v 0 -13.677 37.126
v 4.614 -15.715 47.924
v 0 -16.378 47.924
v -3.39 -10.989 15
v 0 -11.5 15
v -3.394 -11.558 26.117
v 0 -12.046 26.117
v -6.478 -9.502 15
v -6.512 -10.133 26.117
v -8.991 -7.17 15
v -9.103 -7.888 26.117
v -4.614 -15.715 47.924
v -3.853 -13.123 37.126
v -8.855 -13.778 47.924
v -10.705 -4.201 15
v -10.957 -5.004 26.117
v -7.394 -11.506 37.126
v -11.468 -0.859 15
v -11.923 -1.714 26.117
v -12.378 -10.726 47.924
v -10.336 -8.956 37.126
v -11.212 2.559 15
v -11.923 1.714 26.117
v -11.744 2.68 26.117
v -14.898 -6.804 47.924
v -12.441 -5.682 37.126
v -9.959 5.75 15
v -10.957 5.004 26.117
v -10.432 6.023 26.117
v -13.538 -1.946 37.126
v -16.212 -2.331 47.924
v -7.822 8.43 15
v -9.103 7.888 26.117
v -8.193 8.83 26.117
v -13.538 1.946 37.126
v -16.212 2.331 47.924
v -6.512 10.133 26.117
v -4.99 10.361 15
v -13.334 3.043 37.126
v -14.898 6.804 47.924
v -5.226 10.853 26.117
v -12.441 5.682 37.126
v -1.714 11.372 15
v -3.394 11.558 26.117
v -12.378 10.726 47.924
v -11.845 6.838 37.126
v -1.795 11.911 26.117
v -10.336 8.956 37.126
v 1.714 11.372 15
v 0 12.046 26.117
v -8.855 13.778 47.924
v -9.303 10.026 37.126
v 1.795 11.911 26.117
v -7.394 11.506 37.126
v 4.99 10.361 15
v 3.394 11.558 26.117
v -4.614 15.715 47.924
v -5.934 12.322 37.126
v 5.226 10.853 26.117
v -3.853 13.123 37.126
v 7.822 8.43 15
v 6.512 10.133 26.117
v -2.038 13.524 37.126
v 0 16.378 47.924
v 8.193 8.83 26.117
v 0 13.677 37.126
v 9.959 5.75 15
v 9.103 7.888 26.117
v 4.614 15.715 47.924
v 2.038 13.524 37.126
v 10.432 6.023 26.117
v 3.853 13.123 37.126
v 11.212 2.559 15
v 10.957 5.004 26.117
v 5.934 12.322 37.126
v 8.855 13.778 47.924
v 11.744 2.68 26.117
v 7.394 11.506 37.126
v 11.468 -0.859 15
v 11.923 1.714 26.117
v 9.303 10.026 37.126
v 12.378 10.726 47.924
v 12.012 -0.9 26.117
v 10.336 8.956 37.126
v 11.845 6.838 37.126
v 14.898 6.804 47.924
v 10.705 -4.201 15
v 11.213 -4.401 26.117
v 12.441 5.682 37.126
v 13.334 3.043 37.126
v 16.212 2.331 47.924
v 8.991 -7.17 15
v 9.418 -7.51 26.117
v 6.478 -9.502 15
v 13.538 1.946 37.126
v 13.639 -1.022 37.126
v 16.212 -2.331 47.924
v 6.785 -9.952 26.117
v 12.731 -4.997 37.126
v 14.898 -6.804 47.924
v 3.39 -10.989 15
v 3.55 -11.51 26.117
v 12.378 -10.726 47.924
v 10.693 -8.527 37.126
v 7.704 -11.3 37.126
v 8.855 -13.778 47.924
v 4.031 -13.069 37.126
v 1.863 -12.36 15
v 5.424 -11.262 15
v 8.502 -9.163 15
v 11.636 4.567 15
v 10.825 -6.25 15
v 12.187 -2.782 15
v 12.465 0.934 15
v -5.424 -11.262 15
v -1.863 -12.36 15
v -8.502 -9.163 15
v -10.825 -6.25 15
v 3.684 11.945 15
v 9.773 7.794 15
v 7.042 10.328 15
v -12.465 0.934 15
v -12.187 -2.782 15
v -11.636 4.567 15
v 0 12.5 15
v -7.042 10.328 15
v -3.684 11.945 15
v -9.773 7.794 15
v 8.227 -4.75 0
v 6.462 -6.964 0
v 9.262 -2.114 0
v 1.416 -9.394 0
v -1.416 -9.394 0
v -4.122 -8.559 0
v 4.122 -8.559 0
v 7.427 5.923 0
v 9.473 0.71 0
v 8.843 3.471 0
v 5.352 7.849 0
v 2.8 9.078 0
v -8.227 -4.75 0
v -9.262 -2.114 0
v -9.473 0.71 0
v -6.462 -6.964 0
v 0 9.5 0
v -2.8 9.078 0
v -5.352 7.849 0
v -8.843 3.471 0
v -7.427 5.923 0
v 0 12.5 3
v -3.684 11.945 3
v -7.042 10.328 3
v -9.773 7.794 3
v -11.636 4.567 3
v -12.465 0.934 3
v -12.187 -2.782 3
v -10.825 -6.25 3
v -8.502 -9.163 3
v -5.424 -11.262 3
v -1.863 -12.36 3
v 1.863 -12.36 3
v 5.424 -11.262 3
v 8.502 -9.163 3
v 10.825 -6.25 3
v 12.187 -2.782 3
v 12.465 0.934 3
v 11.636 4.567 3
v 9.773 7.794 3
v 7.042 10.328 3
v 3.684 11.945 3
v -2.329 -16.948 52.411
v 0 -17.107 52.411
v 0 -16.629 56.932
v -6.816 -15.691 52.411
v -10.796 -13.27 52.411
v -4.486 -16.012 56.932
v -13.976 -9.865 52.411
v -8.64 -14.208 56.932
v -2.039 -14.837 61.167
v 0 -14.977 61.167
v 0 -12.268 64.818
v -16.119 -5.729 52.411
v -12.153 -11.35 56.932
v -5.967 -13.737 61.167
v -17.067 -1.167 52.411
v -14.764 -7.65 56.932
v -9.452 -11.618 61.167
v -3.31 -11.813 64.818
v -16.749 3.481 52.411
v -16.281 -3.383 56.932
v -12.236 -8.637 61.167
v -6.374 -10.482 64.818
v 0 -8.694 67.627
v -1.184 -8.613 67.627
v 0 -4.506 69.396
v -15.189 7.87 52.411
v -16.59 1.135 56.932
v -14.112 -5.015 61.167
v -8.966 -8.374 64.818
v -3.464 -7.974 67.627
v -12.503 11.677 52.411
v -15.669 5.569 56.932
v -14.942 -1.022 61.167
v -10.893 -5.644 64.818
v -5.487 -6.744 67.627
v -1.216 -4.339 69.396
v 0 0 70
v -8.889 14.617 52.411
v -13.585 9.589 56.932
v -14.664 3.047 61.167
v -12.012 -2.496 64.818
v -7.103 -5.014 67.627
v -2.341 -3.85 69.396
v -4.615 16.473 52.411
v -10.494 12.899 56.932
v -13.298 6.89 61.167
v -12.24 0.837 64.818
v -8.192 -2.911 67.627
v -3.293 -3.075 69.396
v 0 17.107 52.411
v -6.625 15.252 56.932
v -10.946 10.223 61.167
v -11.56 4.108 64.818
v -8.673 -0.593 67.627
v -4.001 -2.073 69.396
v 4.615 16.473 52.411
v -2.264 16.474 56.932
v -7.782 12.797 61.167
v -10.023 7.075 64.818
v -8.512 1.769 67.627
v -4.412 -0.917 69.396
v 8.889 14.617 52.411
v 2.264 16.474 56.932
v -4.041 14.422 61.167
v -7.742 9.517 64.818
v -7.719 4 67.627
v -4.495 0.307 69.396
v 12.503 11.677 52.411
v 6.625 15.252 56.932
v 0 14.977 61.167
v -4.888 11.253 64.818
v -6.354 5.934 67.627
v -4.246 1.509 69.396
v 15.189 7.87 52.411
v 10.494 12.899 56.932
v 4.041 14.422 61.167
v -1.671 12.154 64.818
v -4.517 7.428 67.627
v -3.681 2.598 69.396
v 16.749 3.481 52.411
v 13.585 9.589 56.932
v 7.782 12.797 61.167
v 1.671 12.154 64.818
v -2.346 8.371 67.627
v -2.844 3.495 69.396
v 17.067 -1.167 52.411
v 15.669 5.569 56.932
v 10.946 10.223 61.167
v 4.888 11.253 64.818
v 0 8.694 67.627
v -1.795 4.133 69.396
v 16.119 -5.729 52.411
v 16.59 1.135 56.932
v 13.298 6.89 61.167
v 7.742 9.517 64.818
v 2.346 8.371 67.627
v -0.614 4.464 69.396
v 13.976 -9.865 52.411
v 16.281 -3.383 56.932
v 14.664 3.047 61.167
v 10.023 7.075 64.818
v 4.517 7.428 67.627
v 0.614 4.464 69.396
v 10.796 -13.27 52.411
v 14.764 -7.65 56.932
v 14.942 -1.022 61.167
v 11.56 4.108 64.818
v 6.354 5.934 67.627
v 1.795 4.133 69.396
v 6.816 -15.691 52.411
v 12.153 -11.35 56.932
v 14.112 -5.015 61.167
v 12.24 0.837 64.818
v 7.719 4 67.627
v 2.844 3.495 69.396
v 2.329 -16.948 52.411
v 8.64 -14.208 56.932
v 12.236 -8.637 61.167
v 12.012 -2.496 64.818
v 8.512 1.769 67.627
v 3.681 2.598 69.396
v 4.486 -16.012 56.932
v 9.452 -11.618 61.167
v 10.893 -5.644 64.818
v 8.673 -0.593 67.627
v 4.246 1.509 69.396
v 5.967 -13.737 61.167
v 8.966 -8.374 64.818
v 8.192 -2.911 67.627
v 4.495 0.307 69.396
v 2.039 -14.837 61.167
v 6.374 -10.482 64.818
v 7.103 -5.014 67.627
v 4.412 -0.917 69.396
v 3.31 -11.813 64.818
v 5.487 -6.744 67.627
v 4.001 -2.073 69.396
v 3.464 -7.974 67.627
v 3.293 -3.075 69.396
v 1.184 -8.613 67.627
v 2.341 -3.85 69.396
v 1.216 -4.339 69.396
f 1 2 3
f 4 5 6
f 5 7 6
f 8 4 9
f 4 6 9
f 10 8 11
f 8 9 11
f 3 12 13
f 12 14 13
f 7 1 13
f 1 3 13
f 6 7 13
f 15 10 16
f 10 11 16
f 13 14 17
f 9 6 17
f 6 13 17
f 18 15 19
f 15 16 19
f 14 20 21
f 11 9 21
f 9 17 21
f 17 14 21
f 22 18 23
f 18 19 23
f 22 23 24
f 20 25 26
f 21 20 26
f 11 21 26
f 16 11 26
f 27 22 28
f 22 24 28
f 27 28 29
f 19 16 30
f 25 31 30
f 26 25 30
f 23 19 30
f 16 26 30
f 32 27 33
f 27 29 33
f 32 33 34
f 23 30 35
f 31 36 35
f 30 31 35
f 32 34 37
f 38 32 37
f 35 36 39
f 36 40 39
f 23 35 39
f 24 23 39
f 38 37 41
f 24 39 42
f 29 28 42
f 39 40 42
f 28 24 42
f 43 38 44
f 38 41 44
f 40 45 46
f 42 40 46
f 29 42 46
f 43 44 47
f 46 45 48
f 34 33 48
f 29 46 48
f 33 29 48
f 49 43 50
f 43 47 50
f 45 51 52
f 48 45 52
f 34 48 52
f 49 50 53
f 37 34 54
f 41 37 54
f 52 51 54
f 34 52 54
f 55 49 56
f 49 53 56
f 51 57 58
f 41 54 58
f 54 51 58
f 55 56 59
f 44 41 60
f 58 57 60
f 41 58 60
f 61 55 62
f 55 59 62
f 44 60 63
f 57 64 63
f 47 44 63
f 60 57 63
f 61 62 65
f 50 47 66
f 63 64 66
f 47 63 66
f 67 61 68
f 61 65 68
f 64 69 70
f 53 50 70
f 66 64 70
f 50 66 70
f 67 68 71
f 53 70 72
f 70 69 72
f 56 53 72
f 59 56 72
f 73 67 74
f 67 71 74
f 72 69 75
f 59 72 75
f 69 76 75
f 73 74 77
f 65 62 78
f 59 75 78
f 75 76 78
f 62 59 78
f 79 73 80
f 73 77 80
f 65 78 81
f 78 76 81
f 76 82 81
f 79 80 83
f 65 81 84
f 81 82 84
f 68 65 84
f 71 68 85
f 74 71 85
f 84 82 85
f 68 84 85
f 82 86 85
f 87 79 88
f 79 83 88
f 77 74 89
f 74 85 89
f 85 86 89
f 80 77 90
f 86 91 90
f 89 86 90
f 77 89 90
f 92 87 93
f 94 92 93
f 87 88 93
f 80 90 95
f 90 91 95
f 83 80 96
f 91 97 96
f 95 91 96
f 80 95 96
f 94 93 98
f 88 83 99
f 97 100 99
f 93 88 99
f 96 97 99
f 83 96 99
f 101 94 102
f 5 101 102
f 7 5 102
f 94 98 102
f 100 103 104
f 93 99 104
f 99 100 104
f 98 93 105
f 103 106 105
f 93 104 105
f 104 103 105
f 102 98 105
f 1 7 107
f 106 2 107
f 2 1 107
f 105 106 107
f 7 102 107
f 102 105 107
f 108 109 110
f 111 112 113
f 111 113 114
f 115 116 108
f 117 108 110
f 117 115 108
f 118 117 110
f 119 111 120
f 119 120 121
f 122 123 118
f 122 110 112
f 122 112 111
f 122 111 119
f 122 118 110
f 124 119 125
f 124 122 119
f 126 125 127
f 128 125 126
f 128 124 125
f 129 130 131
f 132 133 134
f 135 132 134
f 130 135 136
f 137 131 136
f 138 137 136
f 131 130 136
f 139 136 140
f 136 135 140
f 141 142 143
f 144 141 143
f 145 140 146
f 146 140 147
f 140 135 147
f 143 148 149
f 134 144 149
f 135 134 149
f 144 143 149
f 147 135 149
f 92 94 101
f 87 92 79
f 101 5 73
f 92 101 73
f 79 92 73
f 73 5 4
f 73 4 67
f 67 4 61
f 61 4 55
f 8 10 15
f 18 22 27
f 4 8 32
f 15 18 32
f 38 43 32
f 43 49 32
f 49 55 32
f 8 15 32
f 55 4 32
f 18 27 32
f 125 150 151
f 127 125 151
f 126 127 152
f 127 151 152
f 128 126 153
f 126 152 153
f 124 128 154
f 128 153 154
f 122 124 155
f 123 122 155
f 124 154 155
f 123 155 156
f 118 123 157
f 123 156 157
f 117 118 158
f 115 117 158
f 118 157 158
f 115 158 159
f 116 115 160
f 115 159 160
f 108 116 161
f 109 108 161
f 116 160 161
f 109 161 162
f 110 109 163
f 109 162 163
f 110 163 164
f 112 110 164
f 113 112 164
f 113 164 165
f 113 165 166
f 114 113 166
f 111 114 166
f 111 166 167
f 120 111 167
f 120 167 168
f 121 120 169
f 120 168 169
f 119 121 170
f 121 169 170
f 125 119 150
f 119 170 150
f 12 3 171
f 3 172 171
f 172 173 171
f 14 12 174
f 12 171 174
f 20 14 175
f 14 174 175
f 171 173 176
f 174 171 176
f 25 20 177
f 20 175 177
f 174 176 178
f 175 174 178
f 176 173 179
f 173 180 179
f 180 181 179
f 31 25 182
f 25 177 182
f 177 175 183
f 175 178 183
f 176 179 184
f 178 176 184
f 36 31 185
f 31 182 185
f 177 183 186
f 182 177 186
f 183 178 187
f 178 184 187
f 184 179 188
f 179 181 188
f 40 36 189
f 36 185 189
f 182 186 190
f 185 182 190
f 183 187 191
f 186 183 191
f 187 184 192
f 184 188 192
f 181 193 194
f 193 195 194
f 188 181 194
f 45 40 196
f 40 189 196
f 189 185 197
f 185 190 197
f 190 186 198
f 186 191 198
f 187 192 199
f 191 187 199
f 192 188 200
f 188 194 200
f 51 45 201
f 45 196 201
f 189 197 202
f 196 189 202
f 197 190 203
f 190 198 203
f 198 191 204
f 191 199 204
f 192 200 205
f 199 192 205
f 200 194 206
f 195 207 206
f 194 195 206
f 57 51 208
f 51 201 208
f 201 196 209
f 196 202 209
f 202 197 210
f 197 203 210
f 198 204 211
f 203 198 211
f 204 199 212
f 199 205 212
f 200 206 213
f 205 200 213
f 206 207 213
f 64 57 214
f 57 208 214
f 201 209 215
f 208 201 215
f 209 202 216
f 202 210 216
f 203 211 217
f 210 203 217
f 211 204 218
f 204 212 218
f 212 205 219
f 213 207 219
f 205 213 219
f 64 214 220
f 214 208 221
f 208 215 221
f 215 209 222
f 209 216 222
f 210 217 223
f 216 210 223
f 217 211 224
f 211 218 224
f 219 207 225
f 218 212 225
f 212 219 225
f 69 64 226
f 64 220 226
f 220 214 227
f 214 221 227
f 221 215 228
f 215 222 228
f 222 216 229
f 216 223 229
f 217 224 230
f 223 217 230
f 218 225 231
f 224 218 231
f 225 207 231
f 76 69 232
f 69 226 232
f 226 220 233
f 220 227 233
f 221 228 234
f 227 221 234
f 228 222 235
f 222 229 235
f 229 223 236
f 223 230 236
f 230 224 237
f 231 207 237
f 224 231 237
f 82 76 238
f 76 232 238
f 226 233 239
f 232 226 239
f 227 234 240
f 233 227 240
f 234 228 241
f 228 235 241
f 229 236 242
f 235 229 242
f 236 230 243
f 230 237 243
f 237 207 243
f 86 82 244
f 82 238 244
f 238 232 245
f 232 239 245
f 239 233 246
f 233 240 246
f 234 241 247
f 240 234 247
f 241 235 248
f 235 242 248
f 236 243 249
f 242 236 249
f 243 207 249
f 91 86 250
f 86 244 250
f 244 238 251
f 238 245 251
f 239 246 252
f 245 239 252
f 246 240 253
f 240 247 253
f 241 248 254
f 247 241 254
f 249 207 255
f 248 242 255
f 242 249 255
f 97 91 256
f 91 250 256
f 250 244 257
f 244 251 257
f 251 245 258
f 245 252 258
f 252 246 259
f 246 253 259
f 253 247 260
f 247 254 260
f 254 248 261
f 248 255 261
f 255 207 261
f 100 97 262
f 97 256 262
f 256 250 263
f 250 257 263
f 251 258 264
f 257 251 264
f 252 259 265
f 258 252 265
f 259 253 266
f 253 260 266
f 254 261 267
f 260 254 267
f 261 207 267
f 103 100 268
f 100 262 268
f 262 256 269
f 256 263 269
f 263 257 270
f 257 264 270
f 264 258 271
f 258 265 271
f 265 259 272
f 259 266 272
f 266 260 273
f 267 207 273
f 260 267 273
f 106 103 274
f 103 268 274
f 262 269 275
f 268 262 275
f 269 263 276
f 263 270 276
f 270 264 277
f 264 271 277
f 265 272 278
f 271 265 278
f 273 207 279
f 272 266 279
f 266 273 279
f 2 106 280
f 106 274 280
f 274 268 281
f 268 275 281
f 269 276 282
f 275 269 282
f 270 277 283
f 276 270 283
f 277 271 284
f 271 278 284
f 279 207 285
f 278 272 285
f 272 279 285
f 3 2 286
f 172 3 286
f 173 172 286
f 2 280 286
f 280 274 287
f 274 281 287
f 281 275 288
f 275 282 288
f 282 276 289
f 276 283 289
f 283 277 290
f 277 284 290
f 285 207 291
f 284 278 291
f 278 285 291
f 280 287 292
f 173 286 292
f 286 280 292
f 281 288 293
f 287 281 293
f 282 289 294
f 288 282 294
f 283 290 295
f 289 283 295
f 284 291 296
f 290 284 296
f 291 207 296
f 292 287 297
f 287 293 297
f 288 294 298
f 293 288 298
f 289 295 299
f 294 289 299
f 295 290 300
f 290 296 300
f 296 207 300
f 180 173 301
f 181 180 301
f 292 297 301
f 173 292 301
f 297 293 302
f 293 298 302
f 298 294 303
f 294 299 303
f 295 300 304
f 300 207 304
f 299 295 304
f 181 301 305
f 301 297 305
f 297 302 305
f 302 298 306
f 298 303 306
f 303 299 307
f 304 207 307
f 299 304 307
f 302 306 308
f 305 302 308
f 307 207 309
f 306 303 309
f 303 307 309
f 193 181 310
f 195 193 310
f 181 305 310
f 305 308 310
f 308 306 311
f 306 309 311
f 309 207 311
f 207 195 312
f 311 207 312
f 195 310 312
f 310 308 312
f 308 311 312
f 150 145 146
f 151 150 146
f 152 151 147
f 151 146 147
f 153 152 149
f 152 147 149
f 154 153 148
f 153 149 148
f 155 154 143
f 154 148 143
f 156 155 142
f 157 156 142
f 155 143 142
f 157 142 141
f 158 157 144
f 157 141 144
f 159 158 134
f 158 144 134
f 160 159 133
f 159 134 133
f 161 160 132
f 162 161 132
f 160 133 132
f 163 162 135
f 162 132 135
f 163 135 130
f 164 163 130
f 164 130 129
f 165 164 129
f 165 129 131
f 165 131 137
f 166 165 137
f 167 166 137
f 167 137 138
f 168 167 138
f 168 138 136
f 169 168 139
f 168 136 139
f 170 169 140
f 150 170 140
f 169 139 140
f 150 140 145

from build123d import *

# Parameters (mm, degrees)
SKETCH1_W     = 15
SKETCH1_H     = 12.5
CHAMFER1_SIZE = 3


with BuildPart() as part:
    # Sketch1 → Revolve1 (revolve)
    with BuildSketch(Plane(origin=(0, 0, 0), x_dir=(0, 0, -1), z_dir=(1, 0, 0)), mode=Mode.PRIVATE) as revolve1_sk:
        with Locations((-7.5, -6.25)):
            Rectangle(SKETCH1_W, SKETCH1_H)
    revolve(revolve1_sk.sketch.rotate(Axis((0, 0, 0), (0, 0, 1)), 180), axis=Axis((0, 0, 0), (0, 0, 1)))

    # Chamfer1
    chamfer1_edges = [part.edges().sort_by_distance(p)[0] for p in [
        (0, -12.5, 0),
    ]]
    chamfer(chamfer1_edges, length=CHAMFER1_SIZE)


with BuildPart() as body_2:
    # Sketch2 → Revolve2 (revolve)
    with BuildSketch(Plane(origin=(0, 0, 0), x_dir=(0, 0, -1), z_dir=(1, 0, 0))):
        with BuildLine():
            Line((-15, 0), (-15, -11.5))
            ThreePointArc((-15, -11.5), (-31.641485331, -12.726231628), (-47.923501777, -16.378438967))
            ThreePointArc((-47.923501777, -16.378438967), (-63.083049036, -13.744317342), (-70, 0))
            Line((-70, 0), (-15, 0))
        make_face()
    revolve(axis=Axis((0, 0, 70), (0, 0, -1)))


solid = Compound([part.part, body_2.part])
